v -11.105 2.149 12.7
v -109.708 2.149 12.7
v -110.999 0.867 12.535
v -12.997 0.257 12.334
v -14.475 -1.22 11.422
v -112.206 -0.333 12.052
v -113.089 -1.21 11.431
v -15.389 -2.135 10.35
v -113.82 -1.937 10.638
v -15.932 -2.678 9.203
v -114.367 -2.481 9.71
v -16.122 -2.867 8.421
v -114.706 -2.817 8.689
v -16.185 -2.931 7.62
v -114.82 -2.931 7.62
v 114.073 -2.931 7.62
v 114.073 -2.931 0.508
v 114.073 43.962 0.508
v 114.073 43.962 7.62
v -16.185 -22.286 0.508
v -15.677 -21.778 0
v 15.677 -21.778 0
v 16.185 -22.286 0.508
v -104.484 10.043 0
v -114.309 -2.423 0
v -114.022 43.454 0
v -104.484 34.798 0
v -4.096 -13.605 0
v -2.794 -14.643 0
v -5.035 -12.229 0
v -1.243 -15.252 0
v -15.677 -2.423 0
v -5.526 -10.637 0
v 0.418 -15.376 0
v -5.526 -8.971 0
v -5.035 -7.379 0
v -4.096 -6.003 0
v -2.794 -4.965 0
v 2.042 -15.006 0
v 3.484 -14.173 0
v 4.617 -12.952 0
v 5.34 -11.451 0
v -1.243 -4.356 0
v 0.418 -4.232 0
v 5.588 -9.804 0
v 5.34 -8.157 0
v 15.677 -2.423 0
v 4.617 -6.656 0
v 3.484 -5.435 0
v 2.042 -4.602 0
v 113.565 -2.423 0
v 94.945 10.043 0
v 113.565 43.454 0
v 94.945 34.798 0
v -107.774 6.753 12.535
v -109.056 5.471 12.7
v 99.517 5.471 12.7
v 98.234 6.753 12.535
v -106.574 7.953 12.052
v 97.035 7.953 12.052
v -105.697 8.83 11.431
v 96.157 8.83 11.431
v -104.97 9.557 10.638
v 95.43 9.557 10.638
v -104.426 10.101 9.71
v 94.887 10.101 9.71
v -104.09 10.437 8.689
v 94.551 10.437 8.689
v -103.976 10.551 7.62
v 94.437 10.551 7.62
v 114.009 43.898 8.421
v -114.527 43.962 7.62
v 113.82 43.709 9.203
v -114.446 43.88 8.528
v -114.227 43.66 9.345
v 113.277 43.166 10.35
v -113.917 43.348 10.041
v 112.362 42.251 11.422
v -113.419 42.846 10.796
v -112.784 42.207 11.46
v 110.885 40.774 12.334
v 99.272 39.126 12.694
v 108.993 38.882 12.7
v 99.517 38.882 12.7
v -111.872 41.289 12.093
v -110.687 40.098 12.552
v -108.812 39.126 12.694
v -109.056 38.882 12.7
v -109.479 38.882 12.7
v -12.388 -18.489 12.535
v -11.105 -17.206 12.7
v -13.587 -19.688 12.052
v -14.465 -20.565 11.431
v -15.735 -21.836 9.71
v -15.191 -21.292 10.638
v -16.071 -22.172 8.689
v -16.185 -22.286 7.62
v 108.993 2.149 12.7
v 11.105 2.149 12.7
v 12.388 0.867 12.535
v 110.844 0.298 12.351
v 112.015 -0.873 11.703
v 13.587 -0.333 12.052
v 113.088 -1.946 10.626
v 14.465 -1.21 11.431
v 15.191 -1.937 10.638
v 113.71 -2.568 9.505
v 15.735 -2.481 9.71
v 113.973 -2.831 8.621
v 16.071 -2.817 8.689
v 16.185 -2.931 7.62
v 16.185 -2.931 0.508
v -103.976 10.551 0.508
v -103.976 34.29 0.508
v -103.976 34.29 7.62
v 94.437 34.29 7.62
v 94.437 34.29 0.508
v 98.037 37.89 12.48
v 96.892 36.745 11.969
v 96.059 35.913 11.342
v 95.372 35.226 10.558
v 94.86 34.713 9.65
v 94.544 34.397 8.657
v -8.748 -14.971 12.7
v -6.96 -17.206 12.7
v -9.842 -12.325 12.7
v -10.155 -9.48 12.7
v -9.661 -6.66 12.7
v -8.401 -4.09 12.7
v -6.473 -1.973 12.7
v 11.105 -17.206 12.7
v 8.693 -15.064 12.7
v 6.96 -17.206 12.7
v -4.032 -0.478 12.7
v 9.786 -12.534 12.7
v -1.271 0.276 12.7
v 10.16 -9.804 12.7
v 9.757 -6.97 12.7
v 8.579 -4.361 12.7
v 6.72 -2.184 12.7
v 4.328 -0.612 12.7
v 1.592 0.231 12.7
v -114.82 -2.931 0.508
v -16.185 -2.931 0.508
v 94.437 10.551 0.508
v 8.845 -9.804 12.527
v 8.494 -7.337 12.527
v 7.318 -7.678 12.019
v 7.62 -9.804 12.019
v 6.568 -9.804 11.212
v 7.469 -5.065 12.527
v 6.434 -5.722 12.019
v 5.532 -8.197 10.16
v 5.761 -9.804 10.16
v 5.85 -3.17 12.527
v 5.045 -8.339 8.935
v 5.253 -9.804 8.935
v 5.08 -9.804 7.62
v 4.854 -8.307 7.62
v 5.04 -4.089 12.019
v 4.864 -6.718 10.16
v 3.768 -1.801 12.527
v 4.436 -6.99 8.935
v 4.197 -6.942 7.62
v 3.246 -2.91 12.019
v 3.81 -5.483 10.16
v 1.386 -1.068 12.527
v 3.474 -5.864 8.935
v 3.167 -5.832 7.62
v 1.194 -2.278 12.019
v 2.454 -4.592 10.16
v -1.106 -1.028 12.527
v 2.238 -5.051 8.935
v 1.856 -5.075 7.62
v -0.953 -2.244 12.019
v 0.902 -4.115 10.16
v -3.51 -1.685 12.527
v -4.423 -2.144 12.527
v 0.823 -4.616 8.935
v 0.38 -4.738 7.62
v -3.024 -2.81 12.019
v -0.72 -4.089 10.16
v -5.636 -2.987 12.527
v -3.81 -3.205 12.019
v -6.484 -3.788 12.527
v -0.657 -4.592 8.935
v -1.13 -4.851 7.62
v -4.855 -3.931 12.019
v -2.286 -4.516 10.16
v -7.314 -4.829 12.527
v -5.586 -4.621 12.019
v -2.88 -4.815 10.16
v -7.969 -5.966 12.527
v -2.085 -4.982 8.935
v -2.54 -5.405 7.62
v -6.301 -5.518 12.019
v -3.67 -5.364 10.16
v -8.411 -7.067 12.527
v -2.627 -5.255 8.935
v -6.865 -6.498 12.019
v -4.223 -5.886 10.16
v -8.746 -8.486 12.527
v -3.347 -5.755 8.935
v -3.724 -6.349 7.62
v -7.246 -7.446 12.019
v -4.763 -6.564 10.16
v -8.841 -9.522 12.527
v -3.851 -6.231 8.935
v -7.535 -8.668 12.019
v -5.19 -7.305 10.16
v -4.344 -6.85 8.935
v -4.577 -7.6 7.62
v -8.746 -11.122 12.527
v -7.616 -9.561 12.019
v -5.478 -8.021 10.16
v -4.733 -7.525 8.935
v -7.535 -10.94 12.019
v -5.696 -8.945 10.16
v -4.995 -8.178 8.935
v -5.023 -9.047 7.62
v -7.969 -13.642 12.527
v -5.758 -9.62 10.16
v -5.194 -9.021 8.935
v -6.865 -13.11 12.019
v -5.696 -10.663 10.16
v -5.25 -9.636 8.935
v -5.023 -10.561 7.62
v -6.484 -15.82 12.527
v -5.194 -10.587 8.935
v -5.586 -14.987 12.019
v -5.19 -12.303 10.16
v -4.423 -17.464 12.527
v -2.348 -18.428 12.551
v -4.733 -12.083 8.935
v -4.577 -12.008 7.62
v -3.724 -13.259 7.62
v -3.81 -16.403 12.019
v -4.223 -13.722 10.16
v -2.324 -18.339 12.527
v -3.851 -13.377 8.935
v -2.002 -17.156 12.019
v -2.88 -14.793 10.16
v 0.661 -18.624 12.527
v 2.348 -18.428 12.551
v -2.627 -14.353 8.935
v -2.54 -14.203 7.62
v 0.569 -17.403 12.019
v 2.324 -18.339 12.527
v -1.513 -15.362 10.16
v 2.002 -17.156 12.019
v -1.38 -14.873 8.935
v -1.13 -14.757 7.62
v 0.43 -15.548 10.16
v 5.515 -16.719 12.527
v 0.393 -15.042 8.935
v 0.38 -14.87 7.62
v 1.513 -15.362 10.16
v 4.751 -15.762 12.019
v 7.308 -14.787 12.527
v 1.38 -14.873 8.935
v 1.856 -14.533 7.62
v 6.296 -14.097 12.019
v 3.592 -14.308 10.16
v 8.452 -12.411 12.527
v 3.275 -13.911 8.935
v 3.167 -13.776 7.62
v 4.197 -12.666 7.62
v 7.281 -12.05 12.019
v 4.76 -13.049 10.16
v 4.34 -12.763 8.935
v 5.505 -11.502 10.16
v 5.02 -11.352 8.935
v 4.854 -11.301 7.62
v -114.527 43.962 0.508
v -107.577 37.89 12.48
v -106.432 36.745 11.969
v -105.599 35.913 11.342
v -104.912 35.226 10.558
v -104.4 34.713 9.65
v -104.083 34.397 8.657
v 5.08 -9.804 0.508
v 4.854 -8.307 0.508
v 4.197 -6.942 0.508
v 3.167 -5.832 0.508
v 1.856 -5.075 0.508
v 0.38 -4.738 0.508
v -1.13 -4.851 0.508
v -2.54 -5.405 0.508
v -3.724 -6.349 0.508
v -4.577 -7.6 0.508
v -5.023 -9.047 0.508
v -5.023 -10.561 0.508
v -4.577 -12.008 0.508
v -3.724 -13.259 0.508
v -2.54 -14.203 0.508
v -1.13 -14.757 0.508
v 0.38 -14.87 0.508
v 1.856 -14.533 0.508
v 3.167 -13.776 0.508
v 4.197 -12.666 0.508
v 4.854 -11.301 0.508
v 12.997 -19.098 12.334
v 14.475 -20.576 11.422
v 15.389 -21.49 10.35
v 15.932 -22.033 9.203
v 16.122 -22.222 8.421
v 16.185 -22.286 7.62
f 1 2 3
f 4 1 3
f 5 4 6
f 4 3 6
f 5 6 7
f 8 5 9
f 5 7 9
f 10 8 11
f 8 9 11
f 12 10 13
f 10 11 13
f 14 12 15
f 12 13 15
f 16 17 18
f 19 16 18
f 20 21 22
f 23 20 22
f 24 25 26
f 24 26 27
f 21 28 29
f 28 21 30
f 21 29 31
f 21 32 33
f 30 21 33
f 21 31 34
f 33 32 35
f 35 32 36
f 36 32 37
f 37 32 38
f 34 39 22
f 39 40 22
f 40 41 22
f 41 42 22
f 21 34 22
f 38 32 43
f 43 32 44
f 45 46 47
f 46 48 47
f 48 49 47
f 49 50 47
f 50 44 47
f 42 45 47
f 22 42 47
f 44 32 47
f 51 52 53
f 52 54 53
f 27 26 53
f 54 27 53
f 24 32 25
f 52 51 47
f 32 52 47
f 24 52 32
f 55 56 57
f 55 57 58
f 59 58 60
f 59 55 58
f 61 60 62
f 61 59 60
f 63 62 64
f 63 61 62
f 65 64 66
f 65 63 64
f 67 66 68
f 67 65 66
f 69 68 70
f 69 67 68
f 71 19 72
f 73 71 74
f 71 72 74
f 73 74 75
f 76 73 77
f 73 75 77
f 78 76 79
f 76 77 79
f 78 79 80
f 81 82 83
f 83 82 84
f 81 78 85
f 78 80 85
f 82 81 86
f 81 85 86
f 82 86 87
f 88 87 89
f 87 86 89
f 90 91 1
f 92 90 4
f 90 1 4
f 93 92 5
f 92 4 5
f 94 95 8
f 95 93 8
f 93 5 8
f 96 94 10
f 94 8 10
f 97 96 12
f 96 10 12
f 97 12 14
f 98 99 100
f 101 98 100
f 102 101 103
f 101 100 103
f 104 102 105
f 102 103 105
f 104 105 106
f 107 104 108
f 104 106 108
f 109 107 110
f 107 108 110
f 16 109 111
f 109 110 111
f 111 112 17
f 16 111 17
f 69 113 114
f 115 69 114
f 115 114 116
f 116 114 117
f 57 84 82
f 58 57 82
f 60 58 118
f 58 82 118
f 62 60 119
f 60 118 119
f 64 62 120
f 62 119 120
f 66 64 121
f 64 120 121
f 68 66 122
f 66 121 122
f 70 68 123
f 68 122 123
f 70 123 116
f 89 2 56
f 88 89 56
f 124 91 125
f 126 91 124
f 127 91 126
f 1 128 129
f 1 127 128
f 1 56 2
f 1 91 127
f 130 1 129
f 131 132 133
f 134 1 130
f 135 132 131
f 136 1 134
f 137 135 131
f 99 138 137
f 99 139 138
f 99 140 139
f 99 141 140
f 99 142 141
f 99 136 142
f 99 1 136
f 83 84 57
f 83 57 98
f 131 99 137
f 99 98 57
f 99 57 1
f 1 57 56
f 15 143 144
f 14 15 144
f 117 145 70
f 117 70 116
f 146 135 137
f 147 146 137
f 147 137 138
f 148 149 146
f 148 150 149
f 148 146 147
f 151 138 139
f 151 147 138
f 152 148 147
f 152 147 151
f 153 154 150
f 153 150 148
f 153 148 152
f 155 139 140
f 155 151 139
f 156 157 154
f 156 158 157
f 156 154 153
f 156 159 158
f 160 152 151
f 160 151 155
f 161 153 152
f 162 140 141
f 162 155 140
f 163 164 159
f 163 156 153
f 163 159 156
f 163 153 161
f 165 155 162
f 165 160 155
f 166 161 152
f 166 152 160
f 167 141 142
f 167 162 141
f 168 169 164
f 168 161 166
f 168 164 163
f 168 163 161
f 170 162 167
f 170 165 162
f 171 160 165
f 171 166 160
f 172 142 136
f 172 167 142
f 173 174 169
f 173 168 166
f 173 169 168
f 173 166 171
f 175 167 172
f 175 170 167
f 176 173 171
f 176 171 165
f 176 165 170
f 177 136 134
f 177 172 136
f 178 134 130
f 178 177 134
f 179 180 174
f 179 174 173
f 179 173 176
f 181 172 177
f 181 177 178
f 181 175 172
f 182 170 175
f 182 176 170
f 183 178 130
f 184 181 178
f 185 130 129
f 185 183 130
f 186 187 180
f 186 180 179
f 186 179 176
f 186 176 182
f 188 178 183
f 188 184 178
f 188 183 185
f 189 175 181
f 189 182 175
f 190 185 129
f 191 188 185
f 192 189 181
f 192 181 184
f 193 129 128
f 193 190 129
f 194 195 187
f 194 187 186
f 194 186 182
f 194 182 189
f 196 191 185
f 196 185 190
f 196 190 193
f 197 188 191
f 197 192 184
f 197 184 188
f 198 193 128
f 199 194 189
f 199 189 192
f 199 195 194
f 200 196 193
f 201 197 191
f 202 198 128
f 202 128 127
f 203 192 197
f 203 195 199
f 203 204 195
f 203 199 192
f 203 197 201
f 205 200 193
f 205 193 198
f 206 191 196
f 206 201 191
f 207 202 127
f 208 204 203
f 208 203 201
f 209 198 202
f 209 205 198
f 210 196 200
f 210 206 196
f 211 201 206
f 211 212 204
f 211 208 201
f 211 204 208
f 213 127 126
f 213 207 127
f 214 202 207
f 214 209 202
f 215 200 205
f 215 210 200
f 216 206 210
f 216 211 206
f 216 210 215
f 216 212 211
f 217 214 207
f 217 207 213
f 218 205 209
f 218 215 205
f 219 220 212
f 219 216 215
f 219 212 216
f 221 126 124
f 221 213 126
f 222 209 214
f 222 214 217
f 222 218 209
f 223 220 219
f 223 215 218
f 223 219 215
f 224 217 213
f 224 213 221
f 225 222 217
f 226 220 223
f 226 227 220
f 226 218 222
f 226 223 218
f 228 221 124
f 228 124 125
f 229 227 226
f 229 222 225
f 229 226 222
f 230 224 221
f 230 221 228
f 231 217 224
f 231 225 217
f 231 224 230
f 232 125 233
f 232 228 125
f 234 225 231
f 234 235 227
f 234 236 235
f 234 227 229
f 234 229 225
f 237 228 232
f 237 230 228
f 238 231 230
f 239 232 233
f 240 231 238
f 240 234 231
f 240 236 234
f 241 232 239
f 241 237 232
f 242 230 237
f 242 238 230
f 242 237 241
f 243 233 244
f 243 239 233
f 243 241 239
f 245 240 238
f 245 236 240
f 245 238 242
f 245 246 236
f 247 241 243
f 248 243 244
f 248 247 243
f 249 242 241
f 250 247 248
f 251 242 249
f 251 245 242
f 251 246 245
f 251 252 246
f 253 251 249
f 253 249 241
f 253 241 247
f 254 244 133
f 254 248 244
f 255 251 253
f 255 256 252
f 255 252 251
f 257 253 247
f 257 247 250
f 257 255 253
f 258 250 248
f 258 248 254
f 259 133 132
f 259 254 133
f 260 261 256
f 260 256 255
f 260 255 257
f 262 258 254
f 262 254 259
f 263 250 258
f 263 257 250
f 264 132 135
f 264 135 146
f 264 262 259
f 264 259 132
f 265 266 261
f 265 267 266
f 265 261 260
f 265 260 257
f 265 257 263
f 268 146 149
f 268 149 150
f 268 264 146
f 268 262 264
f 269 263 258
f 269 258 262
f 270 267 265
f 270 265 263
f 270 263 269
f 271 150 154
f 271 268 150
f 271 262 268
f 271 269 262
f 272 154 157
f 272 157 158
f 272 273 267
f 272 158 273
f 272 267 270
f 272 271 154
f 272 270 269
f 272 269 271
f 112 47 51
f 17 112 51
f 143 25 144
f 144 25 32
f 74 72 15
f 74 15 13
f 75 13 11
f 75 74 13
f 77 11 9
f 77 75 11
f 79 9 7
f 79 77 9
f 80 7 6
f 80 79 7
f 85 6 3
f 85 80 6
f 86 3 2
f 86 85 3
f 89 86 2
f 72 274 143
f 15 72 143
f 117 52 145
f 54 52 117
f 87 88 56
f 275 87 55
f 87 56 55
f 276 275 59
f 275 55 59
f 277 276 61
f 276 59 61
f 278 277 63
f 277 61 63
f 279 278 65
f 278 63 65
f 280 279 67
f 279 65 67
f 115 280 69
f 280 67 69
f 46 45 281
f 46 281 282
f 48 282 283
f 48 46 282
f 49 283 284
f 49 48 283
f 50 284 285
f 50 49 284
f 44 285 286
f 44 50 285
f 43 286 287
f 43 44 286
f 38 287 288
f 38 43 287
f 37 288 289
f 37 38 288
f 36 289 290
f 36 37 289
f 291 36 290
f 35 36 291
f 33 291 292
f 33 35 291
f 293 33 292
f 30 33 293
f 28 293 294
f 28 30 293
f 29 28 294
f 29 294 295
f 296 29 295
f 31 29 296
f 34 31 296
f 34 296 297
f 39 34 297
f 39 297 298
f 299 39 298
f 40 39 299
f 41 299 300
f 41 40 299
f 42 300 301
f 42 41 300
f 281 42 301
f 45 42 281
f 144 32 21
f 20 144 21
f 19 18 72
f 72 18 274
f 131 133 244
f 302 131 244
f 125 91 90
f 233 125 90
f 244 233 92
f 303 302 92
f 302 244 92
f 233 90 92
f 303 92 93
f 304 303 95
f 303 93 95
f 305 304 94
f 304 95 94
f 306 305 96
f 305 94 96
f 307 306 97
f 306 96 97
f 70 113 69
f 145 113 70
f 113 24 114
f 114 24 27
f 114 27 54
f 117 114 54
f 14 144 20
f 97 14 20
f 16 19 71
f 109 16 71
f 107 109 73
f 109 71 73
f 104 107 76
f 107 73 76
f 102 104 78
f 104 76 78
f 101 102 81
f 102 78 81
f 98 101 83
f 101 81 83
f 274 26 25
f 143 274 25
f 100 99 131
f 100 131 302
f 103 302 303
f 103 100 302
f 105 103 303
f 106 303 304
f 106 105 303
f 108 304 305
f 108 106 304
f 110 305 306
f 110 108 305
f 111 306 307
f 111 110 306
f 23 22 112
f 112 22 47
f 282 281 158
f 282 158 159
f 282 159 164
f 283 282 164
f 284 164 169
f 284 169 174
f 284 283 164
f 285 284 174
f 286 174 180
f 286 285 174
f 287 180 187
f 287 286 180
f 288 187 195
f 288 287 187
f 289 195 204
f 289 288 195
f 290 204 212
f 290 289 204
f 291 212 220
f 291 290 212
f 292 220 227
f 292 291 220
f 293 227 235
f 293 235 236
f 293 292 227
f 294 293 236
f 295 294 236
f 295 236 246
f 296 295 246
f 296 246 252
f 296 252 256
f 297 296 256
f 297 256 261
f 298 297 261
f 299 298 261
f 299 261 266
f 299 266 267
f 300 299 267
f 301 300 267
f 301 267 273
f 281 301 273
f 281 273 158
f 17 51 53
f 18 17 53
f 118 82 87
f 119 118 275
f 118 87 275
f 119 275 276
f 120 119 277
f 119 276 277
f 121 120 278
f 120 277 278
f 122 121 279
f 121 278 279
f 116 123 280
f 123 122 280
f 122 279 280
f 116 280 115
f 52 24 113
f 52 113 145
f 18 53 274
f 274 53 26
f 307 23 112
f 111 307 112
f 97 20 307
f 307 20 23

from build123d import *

# Parameters (mm, degrees)
F1_R         = 5.08
F2_DEPTH     = 12.7
F0_W         = 198.4130797122
F0_H         = 23.7392307692
F4_T1_DEPTH  = 254
F4_T3_DEPTH  = 72.2932235662
F4_T5_DEPTH  = 111.3350497574
F4_T7_DEPTH  = 32.0552179203
F4_T9_DEPTH  = 57.7703390416
F4_T11_DEPTH = 110.5876909131
F4_T13_DEPTH = 72.2923076923
F4_T15_DEPTH = 23.7392307692
F4_T17_DEPTH = 198.4130797122
F4_T25_DEPTH = 124.0350497574
F4_T29_DEPTH = 44.7552179203
F4_T36_DEPTH = 44.7552179203
F4_T40_DEPTH = 123.2876909131
F4_T47_DEPTH = 36.4392307692
F4_T51_DEPTH = 211.1130797122
F4_T58_DEPTH = 36.4392307692
F4_T62_DEPTH = 211.1130797122
F4_T69_DEPTH = 211.1130797122
F4_T73_DEPTH = 36.4392307692
F4_T80_DEPTH = 36.4392307692
F4_T84_DEPTH = 211.1130797122
F5_SIZE      = 0.508


# Not quite as in the source:
# - a fillet or chamfer that OpenCascade refuses, or shapes differently, is made with other operations: its cross-section is extruded or revolved along the edge and cut away or added


with BuildPart() as f2:
    # F1 (on face) → F2 (new body)
    with BuildSketch(Plane.XY):
        Polygon((16.1851695208, -22.2859871511), (16.1851695208, -2.9307692308), (-16.1851695208, -2.9307692308), (-16.1851695208, -22.2859871511), (0, -22.2859871511), align=None)
        with Locations((0, -9.8040097783)):
            Circle(F1_R, mode=Mode.SUBTRACT)
    extrude(amount=F2_DEPTH)


with BuildPart() as f2b:
    # F0 (on Top) → F2, piece 2 (new body)
    with BuildSketch(Plane.XY):
        Polygon((114.0728604339, 43.9615384615), (-114.5271395661, 43.9615384615), (-114.8202192782, -2.9307692308), (-16.1851695208, -2.9307692308), (16.1851695208, -2.9307692308), (114.0728604339, -2.9307692308), align=None)
        with Locations((-4.7698304792, 22.4203846154)):
            Rectangle(F0_W, F0_H, mode=Mode.SUBTRACT)
    extrude(amount=F2_DEPTH)


with BuildPart() as f2_1:
    add(f2.part)

    # F3: union F2b
    add(f2b.part)

    # F4: fillet of radius 5.08 on 13 edges, made by hand

    # F4_s2 → F4_t1 (cut)
    with BuildSketch(Plane.YZ.offset(-127.2271395661)):
        with BuildLine():
            ThreePointArc((43.9615384615, 7.62), (42.47364091, 11.2121024484), (38.8815384615, 12.7))
            Line((38.8815384615, 12.7), (43.9615384615, 12.7))
            Line((43.9615384615, 12.7), (43.9615384615, 7.62))
        make_face()
    extrude(amount=F4_T1_DEPTH, mode=Mode.SUBTRACT)

    # F4_s4 → F4_t3 (cut)
    with BuildSketch(Plane(origin=(0.3496520758, 55.9437997302, 0), x_dir=(0, 0, 1), z_dir=(-0.0062499374, -0.999980469, 0))):
        with BuildLine():
            ThreePointArc((7.62, 114.7996595946), (11.2121024484, 113.311762043), (12.7, 109.7196595946))
            Line((12.7, 109.7196595946), (12.7, 114.7996595946))
            Line((12.7, 114.7996595946), (7.62, 114.7996595946))
        make_face()
    extrude(amount=F4_T3_DEPTH, mode=Mode.SUBTRACT)

    # F4_s6 → F4_t5 (cut)
    with BuildSketch(Plane.YZ.offset(-127.5202192782)):
        with BuildLine():
            ThreePointArc((2.1492307692, 12.7), (-1.4428716792, 11.2121024484), (-2.9307692308, 7.62))
            Line((-2.9307692308, 7.62), (-2.9307692308, 12.7))
            Line((-2.9307692308, 12.7), (2.1492307692, 12.7))
        make_face()
    extrude(amount=F4_T5_DEPTH, mode=Mode.SUBTRACT)

    # F4_s8 → F4_t7 (cut)
    with BuildSketch(Plane.XZ.offset(2.9307692308)):
        with BuildLine():
            ThreePointArc((-11.1051695208, 12.7), (-14.6972719692, 11.2121024484), (-16.1851695208, 7.62))
            Line((-16.1851695208, 7.62), (-16.1851695208, 12.7))
            Line((-16.1851695208, 12.7), (-11.1051695208, 12.7))
        make_face()
        with BuildLine():
            ThreePointArc((11.1051695208, 12.7), (14.6972719692, 11.2121024484), (16.1851695208, 7.62))
            Line((16.1851695208, 7.62), (16.1851695208, 12.7))
            Line((16.1851695208, 12.7), (11.1051695208, 12.7))
        make_face()
    extrude(amount=F4_T7_DEPTH, mode=Mode.SUBTRACT)

    # F4_s10 → F4_t9 (cut)
    with BuildSketch(Plane.YZ.offset(-28.8851695208)):
        with BuildLine():
            ThreePointArc((-17.2059871511, 12.7), (-20.7980895995, 11.2121024484), (-22.2859871511, 7.62))
            Line((-22.2859871511, 7.62), (-22.2859871511, 12.7))
            Line((-22.2859871511, 12.7), (-17.2059871511, 12.7))
        make_face()
    extrude(amount=F4_T9_DEPTH, mode=Mode.SUBTRACT)

    # F4_s12 → F4_t11 (cut)
    with BuildSketch(Plane.YZ.offset(16.1851695208)):
        with BuildLine():
            ThreePointArc((2.1492307692, 12.7), (-1.4428716792, 11.2121024484), (-2.9307692308, 7.62))
            Line((-2.9307692308, 7.62), (-2.9307692308, 12.7))
            Line((-2.9307692308, 12.7), (2.1492307692, 12.7))
        make_face()
    extrude(amount=F4_T11_DEPTH, mode=Mode.SUBTRACT)

    # F4_s14 → F4_t13 (cut)
    with BuildSketch(Plane.XZ.offset(-56.6615384615)):
        with BuildLine():
            ThreePointArc((114.0728604339, 7.62), (112.5849628824, 11.2121024484), (108.9928604339, 12.7))
            Line((108.9928604339, 12.7), (114.0728604339, 12.7))
            Line((114.0728604339, 12.7), (114.0728604339, 7.62))
        make_face()
    extrude(amount=F4_T13_DEPTH, mode=Mode.SUBTRACT)

    # F4_s16 → F4_t15 (cut)
    with BuildSketch(Plane.XZ.offset(-34.29)):
        with BuildLine():
            ThreePointArc((-109.0563703353, 12.7), (-105.4642678869, 11.2121024484), (-103.9763703353, 7.62))
            Line((-103.9763703353, 7.62), (-103.9763703353, 12.7))
            Line((-103.9763703353, 12.7), (-109.0563703353, 12.7))
        make_face()
        with BuildLine():
            ThreePointArc((99.5167093769, 12.7), (95.9246069285, 11.2121024484), (94.4367093769, 7.62))
            Line((94.4367093769, 7.62), (94.4367093769, 12.7))
            Line((94.4367093769, 12.7), (99.5167093769, 12.7))
        make_face()
    extrude(amount=F4_T15_DEPTH, mode=Mode.SUBTRACT)

    # F4_s18 → F4_t17 (cut)
    with BuildSketch(Plane.YZ.offset(-103.9763703353)):
        with BuildLine():
            ThreePointArc((39.37, 12.7), (35.7778975516, 11.2121024484), (34.29, 7.62))
            Line((34.29, 7.62), (34.29, 12.7))
            Line((34.29, 12.7), (39.37, 12.7))
        make_face()
        with BuildLine():
            ThreePointArc((5.4707692308, 12.7), (9.0628716792, 11.2121024484), (10.5507692308, 7.62))
            Line((10.5507692308, 7.62), (10.5507692308, 12.7))
            Line((10.5507692308, 12.7), (5.4707692308, 12.7))
        make_face()
    extrude(amount=F4_T17_DEPTH, mode=Mode.SUBTRACT)

    # F4_s19 → F4_t20 (revolve, cut)
    with BuildSketch(Plane.XZ.offset(9.8040097783)):
        with BuildLine():
            ThreePointArc((10.16, 12.7), (6.5678975516, 11.2121024484), (5.08, 7.62))
            Line((5.08, 7.62), (5.08, 12.7))
            Line((5.08, 12.7), (10.16, 12.7))
        make_face()
    revolve(axis=Axis((0, -9.8040097783, 12.7), (0, 0, 1)), mode=Mode.SUBTRACT)


with BuildPart() as f4_tool23:
    # F4_s24 → F4_t25 (new body)
    with BuildSketch(Plane.YZ.offset(-3.4851695208)):
        with BuildLine():
            ThreePointArc((2.1492307692, 12.7), (-1.4428716792, 11.2121024484), (-2.9307692308, 7.62))
            Line((-2.9307692308, 7.62), (-2.9307692308, 12.7))
            Line((-2.9307692308, 12.7), (2.1492307692, 12.7))
        make_face()
    extrude(amount=-F4_T25_DEPTH)

    split(bisect_by=Plane.YZ.offset(-16.1851695208), keep=Keep.TOP)


with BuildPart() as f4_tool27:
    # F4_s28 → F4_t29 (new body)
    with BuildSketch(Plane.XZ.offset(-9.7692307692)):
        with BuildLine():
            ThreePointArc((-11.1051695208, 12.7), (-14.6972719692, 11.2121024484), (-16.1851695208, 7.62))
            Line((-16.1851695208, 7.62), (-16.1851695208, 12.7))
            Line((-16.1851695208, 12.7), (-11.1051695208, 12.7))
        make_face()
    extrude(amount=F4_T29_DEPTH)

    split(bisect_by=Plane.XZ.offset(2.9307692308), keep=Keep.BOTTOM)


with BuildPart() as f4_tool23_1:
    add(f4_tool23.part)

    # F4_t31: intersect F4_tool27
    add(f4_tool27.part, mode=Mode.INTERSECT)


with BuildPart() as f2_2:
    add(f2_1.part)

    # F4_t21: cut F4_tool23
    add(f4_tool23_1.part, mode=Mode.SUBTRACT)


with BuildPart() as f4_tool34:
    # F4_s35 → F4_t36 (new body)
    with BuildSketch(Plane.XZ.offset(34.9859871511)):
        with BuildLine():
            ThreePointArc((11.1051695208, 12.7), (14.6972719692, 11.2121024484), (16.1851695208, 7.62))
            Line((16.1851695208, 7.62), (16.1851695208, 12.7))
            Line((16.1851695208, 12.7), (11.1051695208, 12.7))
        make_face()
    extrude(amount=-F4_T36_DEPTH)

    split(bisect_by=Plane.XZ.offset(2.9307692308), keep=Keep.BOTTOM)


with BuildPart() as f4_tool38:
    # F4_s39 → F4_t40 (new body)
    with BuildSketch(Plane.YZ.offset(126.7728604339)):
        with BuildLine():
            ThreePointArc((2.1492307692, 12.7), (-1.4428716792, 11.2121024484), (-2.9307692308, 7.62))
            Line((-2.9307692308, 7.62), (-2.9307692308, 12.7))
            Line((-2.9307692308, 12.7), (2.1492307692, 12.7))
        make_face()
    extrude(amount=-F4_T40_DEPTH)

    split(bisect_by=Plane.YZ.offset(16.1851695208), keep=Keep.BOTTOM)


with BuildPart() as f4_tool34_1:
    add(f4_tool34.part)

    # F4_t42: intersect F4_tool38
    add(f4_tool38.part, mode=Mode.INTERSECT)


with BuildPart() as f2_3:
    add(f2_2.part)

    # F4_t32: cut F4_tool34
    add(f4_tool34_1.part, mode=Mode.SUBTRACT)


with BuildPart() as f4_tool45:
    # F4_s46 → F4_t47 (new body)
    with BuildSketch(Plane.XZ.offset(2.1492307692)):
        with BuildLine():
            ThreePointArc((-109.0563703353, 12.7), (-105.4642678869, 11.2121024484), (-103.9763703353, 7.62))
            Line((-103.9763703353, 7.62), (-103.9763703353, 12.7))
            Line((-103.9763703353, 12.7), (-109.0563703353, 12.7))
        make_face()
    extrude(amount=-F4_T47_DEPTH)

    split(bisect_by=Plane.XZ.offset(-10.5507692308), keep=Keep.TOP)


with BuildPart() as f4_tool49:
    # F4_s50 → F4_t51 (new body)
    with BuildSketch(Plane.YZ.offset(94.4367093769)):
        with BuildLine():
            ThreePointArc((5.4707692308, 12.7), (9.0628716792, 11.2121024484), (10.5507692308, 7.62))
            Line((10.5507692308, 7.62), (10.5507692308, 12.7))
            Line((10.5507692308, 12.7), (5.4707692308, 12.7))
        make_face()
    extrude(amount=-F4_T51_DEPTH)

    split(bisect_by=Plane.YZ.offset(-103.9763703353), keep=Keep.BOTTOM)


with BuildPart() as f4_tool45_1:
    add(f4_tool45.part)

    # F4_t53: intersect F4_tool49
    add(f4_tool49.part, mode=Mode.INTERSECT)


with BuildPart() as f2_4:
    add(f2_3.part)

    # F4_t43: cut F4_tool45
    add(f4_tool45_1.part, mode=Mode.SUBTRACT)


with BuildPart() as f4_tool56:
    # F4_s57 → F4_t58 (new body)
    with BuildSketch(Plane.XZ.offset(-10.5507692308)):
        with BuildLine():
            ThreePointArc((-109.0563703353, 12.7), (-105.4642678869, 11.2121024484), (-103.9763703353, 7.62))
            Line((-103.9763703353, 7.62), (-103.9763703353, 12.7))
            Line((-103.9763703353, 12.7), (-109.0563703353, 12.7))
        make_face()
    extrude(amount=-F4_T58_DEPTH)

    split(bisect_by=Plane.XZ.offset(-34.29), keep=Keep.BOTTOM)


with BuildPart() as f4_tool60:
    # F4_s61 → F4_t62 (new body)
    with BuildSketch(Plane.YZ.offset(-116.6763703353)):
        with BuildLine():
            ThreePointArc((39.37, 12.7), (35.7778975516, 11.2121024484), (34.29, 7.62))
            Line((34.29, 7.62), (34.29, 12.7))
            Line((34.29, 12.7), (39.37, 12.7))
        make_face()
    extrude(amount=F4_T62_DEPTH)

    split(bisect_by=Plane.YZ.offset(-103.9763703353), keep=Keep.BOTTOM)


with BuildPart() as f4_tool56_1:
    add(f4_tool56.part)

    # F4_t64: intersect F4_tool60
    add(f4_tool60.part, mode=Mode.INTERSECT)


with BuildPart() as f2_5:
    add(f2_4.part)

    # F4_t54: cut F4_tool56
    add(f4_tool56_1.part, mode=Mode.SUBTRACT)


with BuildPart() as f4_tool67:
    # F4_s68 → F4_t69 (new body)
    with BuildSketch(Plane.YZ.offset(-103.9763703353)):
        with BuildLine():
            ThreePointArc((39.37, 12.7), (35.7778975516, 11.2121024484), (34.29, 7.62))
            Line((34.29, 7.62), (34.29, 12.7))
            Line((34.29, 12.7), (39.37, 12.7))
        make_face()
    extrude(amount=F4_T69_DEPTH)

    split(bisect_by=Plane.YZ.offset(94.4367093769), keep=Keep.TOP)


with BuildPart() as f4_tool71:
    # F4_s72 → F4_t73 (new body)
    with BuildSketch(Plane.XZ.offset(-46.99)):
        with BuildLine():
            ThreePointArc((99.5167093769, 12.7), (95.9246069285, 11.2121024484), (94.4367093769, 7.62))
            Line((94.4367093769, 7.62), (94.4367093769, 12.7))
            Line((94.4367093769, 12.7), (99.5167093769, 12.7))
        make_face()
    extrude(amount=F4_T73_DEPTH)

    split(bisect_by=Plane.XZ.offset(-34.29), keep=Keep.BOTTOM)


with BuildPart() as f4_tool67_1:
    add(f4_tool67.part)

    # F4_t75: intersect F4_tool71
    add(f4_tool71.part, mode=Mode.INTERSECT)


with BuildPart() as f2_6:
    add(f2_5.part)

    # F4_t65: cut F4_tool67
    add(f4_tool67_1.part, mode=Mode.SUBTRACT)


with BuildPart() as f4_tool78:
    # F4_s79 → F4_t80 (new body)
    with BuildSketch(Plane.XZ.offset(-34.29)):
        with BuildLine():
            ThreePointArc((99.5167093769, 12.7), (95.9246069285, 11.2121024484), (94.4367093769, 7.62))
            Line((94.4367093769, 7.62), (94.4367093769, 12.7))
            Line((94.4367093769, 12.7), (99.5167093769, 12.7))
        make_face()
    extrude(amount=F4_T80_DEPTH)

    split(bisect_by=Plane.XZ.offset(-10.5507692308), keep=Keep.TOP)


with BuildPart() as f4_tool82:
    # F4_s83 → F4_t84 (new body)
    with BuildSketch(Plane.YZ.offset(107.1367093769)):
        with BuildLine():
            ThreePointArc((5.4707692308, 12.7), (9.0628716792, 11.2121024484), (10.5507692308, 7.62))
            Line((10.5507692308, 7.62), (10.5507692308, 12.7))
            Line((10.5507692308, 12.7), (5.4707692308, 12.7))
        make_face()
    extrude(amount=-F4_T84_DEPTH)

    split(bisect_by=Plane.YZ.offset(94.4367093769), keep=Keep.TOP)


with BuildPart() as f4_tool78_1:
    add(f4_tool78.part)

    # F4_t86: intersect F4_tool82
    add(f4_tool82.part, mode=Mode.INTERSECT)


with BuildPart() as f2_7:
    add(f2_6.part)

    # F4_t76: cut F4_tool78
    add(f4_tool78_1.part, mode=Mode.SUBTRACT)

    # F5
    f5_edges = [f2_7.edges().sort_by_distance(p)[0] for p in [
        (-0.22714, 43.961538, 0),
        (-114.673679, 20.515385, 0),
        (-65.502694, -2.930769, 0),
        (-16.18517, -12.608378, 0),
        (0, -22.285987, 0),
        (16.18517, -12.608378, 0),
        (65.129015, -2.930769, 0),
        (114.07286, 20.515385, 0),
        (-103.97637, 22.420385, 0),
        (-4.76983, 34.29, 0),
        (94.436709, 22.420385, 0),
        (-4.76983, 10.550769, 0),
        (-5.08, -9.80401, 0),
    ]]
    chamfer(f5_edges, length=F5_SIZE)


solid = f2_7.part
